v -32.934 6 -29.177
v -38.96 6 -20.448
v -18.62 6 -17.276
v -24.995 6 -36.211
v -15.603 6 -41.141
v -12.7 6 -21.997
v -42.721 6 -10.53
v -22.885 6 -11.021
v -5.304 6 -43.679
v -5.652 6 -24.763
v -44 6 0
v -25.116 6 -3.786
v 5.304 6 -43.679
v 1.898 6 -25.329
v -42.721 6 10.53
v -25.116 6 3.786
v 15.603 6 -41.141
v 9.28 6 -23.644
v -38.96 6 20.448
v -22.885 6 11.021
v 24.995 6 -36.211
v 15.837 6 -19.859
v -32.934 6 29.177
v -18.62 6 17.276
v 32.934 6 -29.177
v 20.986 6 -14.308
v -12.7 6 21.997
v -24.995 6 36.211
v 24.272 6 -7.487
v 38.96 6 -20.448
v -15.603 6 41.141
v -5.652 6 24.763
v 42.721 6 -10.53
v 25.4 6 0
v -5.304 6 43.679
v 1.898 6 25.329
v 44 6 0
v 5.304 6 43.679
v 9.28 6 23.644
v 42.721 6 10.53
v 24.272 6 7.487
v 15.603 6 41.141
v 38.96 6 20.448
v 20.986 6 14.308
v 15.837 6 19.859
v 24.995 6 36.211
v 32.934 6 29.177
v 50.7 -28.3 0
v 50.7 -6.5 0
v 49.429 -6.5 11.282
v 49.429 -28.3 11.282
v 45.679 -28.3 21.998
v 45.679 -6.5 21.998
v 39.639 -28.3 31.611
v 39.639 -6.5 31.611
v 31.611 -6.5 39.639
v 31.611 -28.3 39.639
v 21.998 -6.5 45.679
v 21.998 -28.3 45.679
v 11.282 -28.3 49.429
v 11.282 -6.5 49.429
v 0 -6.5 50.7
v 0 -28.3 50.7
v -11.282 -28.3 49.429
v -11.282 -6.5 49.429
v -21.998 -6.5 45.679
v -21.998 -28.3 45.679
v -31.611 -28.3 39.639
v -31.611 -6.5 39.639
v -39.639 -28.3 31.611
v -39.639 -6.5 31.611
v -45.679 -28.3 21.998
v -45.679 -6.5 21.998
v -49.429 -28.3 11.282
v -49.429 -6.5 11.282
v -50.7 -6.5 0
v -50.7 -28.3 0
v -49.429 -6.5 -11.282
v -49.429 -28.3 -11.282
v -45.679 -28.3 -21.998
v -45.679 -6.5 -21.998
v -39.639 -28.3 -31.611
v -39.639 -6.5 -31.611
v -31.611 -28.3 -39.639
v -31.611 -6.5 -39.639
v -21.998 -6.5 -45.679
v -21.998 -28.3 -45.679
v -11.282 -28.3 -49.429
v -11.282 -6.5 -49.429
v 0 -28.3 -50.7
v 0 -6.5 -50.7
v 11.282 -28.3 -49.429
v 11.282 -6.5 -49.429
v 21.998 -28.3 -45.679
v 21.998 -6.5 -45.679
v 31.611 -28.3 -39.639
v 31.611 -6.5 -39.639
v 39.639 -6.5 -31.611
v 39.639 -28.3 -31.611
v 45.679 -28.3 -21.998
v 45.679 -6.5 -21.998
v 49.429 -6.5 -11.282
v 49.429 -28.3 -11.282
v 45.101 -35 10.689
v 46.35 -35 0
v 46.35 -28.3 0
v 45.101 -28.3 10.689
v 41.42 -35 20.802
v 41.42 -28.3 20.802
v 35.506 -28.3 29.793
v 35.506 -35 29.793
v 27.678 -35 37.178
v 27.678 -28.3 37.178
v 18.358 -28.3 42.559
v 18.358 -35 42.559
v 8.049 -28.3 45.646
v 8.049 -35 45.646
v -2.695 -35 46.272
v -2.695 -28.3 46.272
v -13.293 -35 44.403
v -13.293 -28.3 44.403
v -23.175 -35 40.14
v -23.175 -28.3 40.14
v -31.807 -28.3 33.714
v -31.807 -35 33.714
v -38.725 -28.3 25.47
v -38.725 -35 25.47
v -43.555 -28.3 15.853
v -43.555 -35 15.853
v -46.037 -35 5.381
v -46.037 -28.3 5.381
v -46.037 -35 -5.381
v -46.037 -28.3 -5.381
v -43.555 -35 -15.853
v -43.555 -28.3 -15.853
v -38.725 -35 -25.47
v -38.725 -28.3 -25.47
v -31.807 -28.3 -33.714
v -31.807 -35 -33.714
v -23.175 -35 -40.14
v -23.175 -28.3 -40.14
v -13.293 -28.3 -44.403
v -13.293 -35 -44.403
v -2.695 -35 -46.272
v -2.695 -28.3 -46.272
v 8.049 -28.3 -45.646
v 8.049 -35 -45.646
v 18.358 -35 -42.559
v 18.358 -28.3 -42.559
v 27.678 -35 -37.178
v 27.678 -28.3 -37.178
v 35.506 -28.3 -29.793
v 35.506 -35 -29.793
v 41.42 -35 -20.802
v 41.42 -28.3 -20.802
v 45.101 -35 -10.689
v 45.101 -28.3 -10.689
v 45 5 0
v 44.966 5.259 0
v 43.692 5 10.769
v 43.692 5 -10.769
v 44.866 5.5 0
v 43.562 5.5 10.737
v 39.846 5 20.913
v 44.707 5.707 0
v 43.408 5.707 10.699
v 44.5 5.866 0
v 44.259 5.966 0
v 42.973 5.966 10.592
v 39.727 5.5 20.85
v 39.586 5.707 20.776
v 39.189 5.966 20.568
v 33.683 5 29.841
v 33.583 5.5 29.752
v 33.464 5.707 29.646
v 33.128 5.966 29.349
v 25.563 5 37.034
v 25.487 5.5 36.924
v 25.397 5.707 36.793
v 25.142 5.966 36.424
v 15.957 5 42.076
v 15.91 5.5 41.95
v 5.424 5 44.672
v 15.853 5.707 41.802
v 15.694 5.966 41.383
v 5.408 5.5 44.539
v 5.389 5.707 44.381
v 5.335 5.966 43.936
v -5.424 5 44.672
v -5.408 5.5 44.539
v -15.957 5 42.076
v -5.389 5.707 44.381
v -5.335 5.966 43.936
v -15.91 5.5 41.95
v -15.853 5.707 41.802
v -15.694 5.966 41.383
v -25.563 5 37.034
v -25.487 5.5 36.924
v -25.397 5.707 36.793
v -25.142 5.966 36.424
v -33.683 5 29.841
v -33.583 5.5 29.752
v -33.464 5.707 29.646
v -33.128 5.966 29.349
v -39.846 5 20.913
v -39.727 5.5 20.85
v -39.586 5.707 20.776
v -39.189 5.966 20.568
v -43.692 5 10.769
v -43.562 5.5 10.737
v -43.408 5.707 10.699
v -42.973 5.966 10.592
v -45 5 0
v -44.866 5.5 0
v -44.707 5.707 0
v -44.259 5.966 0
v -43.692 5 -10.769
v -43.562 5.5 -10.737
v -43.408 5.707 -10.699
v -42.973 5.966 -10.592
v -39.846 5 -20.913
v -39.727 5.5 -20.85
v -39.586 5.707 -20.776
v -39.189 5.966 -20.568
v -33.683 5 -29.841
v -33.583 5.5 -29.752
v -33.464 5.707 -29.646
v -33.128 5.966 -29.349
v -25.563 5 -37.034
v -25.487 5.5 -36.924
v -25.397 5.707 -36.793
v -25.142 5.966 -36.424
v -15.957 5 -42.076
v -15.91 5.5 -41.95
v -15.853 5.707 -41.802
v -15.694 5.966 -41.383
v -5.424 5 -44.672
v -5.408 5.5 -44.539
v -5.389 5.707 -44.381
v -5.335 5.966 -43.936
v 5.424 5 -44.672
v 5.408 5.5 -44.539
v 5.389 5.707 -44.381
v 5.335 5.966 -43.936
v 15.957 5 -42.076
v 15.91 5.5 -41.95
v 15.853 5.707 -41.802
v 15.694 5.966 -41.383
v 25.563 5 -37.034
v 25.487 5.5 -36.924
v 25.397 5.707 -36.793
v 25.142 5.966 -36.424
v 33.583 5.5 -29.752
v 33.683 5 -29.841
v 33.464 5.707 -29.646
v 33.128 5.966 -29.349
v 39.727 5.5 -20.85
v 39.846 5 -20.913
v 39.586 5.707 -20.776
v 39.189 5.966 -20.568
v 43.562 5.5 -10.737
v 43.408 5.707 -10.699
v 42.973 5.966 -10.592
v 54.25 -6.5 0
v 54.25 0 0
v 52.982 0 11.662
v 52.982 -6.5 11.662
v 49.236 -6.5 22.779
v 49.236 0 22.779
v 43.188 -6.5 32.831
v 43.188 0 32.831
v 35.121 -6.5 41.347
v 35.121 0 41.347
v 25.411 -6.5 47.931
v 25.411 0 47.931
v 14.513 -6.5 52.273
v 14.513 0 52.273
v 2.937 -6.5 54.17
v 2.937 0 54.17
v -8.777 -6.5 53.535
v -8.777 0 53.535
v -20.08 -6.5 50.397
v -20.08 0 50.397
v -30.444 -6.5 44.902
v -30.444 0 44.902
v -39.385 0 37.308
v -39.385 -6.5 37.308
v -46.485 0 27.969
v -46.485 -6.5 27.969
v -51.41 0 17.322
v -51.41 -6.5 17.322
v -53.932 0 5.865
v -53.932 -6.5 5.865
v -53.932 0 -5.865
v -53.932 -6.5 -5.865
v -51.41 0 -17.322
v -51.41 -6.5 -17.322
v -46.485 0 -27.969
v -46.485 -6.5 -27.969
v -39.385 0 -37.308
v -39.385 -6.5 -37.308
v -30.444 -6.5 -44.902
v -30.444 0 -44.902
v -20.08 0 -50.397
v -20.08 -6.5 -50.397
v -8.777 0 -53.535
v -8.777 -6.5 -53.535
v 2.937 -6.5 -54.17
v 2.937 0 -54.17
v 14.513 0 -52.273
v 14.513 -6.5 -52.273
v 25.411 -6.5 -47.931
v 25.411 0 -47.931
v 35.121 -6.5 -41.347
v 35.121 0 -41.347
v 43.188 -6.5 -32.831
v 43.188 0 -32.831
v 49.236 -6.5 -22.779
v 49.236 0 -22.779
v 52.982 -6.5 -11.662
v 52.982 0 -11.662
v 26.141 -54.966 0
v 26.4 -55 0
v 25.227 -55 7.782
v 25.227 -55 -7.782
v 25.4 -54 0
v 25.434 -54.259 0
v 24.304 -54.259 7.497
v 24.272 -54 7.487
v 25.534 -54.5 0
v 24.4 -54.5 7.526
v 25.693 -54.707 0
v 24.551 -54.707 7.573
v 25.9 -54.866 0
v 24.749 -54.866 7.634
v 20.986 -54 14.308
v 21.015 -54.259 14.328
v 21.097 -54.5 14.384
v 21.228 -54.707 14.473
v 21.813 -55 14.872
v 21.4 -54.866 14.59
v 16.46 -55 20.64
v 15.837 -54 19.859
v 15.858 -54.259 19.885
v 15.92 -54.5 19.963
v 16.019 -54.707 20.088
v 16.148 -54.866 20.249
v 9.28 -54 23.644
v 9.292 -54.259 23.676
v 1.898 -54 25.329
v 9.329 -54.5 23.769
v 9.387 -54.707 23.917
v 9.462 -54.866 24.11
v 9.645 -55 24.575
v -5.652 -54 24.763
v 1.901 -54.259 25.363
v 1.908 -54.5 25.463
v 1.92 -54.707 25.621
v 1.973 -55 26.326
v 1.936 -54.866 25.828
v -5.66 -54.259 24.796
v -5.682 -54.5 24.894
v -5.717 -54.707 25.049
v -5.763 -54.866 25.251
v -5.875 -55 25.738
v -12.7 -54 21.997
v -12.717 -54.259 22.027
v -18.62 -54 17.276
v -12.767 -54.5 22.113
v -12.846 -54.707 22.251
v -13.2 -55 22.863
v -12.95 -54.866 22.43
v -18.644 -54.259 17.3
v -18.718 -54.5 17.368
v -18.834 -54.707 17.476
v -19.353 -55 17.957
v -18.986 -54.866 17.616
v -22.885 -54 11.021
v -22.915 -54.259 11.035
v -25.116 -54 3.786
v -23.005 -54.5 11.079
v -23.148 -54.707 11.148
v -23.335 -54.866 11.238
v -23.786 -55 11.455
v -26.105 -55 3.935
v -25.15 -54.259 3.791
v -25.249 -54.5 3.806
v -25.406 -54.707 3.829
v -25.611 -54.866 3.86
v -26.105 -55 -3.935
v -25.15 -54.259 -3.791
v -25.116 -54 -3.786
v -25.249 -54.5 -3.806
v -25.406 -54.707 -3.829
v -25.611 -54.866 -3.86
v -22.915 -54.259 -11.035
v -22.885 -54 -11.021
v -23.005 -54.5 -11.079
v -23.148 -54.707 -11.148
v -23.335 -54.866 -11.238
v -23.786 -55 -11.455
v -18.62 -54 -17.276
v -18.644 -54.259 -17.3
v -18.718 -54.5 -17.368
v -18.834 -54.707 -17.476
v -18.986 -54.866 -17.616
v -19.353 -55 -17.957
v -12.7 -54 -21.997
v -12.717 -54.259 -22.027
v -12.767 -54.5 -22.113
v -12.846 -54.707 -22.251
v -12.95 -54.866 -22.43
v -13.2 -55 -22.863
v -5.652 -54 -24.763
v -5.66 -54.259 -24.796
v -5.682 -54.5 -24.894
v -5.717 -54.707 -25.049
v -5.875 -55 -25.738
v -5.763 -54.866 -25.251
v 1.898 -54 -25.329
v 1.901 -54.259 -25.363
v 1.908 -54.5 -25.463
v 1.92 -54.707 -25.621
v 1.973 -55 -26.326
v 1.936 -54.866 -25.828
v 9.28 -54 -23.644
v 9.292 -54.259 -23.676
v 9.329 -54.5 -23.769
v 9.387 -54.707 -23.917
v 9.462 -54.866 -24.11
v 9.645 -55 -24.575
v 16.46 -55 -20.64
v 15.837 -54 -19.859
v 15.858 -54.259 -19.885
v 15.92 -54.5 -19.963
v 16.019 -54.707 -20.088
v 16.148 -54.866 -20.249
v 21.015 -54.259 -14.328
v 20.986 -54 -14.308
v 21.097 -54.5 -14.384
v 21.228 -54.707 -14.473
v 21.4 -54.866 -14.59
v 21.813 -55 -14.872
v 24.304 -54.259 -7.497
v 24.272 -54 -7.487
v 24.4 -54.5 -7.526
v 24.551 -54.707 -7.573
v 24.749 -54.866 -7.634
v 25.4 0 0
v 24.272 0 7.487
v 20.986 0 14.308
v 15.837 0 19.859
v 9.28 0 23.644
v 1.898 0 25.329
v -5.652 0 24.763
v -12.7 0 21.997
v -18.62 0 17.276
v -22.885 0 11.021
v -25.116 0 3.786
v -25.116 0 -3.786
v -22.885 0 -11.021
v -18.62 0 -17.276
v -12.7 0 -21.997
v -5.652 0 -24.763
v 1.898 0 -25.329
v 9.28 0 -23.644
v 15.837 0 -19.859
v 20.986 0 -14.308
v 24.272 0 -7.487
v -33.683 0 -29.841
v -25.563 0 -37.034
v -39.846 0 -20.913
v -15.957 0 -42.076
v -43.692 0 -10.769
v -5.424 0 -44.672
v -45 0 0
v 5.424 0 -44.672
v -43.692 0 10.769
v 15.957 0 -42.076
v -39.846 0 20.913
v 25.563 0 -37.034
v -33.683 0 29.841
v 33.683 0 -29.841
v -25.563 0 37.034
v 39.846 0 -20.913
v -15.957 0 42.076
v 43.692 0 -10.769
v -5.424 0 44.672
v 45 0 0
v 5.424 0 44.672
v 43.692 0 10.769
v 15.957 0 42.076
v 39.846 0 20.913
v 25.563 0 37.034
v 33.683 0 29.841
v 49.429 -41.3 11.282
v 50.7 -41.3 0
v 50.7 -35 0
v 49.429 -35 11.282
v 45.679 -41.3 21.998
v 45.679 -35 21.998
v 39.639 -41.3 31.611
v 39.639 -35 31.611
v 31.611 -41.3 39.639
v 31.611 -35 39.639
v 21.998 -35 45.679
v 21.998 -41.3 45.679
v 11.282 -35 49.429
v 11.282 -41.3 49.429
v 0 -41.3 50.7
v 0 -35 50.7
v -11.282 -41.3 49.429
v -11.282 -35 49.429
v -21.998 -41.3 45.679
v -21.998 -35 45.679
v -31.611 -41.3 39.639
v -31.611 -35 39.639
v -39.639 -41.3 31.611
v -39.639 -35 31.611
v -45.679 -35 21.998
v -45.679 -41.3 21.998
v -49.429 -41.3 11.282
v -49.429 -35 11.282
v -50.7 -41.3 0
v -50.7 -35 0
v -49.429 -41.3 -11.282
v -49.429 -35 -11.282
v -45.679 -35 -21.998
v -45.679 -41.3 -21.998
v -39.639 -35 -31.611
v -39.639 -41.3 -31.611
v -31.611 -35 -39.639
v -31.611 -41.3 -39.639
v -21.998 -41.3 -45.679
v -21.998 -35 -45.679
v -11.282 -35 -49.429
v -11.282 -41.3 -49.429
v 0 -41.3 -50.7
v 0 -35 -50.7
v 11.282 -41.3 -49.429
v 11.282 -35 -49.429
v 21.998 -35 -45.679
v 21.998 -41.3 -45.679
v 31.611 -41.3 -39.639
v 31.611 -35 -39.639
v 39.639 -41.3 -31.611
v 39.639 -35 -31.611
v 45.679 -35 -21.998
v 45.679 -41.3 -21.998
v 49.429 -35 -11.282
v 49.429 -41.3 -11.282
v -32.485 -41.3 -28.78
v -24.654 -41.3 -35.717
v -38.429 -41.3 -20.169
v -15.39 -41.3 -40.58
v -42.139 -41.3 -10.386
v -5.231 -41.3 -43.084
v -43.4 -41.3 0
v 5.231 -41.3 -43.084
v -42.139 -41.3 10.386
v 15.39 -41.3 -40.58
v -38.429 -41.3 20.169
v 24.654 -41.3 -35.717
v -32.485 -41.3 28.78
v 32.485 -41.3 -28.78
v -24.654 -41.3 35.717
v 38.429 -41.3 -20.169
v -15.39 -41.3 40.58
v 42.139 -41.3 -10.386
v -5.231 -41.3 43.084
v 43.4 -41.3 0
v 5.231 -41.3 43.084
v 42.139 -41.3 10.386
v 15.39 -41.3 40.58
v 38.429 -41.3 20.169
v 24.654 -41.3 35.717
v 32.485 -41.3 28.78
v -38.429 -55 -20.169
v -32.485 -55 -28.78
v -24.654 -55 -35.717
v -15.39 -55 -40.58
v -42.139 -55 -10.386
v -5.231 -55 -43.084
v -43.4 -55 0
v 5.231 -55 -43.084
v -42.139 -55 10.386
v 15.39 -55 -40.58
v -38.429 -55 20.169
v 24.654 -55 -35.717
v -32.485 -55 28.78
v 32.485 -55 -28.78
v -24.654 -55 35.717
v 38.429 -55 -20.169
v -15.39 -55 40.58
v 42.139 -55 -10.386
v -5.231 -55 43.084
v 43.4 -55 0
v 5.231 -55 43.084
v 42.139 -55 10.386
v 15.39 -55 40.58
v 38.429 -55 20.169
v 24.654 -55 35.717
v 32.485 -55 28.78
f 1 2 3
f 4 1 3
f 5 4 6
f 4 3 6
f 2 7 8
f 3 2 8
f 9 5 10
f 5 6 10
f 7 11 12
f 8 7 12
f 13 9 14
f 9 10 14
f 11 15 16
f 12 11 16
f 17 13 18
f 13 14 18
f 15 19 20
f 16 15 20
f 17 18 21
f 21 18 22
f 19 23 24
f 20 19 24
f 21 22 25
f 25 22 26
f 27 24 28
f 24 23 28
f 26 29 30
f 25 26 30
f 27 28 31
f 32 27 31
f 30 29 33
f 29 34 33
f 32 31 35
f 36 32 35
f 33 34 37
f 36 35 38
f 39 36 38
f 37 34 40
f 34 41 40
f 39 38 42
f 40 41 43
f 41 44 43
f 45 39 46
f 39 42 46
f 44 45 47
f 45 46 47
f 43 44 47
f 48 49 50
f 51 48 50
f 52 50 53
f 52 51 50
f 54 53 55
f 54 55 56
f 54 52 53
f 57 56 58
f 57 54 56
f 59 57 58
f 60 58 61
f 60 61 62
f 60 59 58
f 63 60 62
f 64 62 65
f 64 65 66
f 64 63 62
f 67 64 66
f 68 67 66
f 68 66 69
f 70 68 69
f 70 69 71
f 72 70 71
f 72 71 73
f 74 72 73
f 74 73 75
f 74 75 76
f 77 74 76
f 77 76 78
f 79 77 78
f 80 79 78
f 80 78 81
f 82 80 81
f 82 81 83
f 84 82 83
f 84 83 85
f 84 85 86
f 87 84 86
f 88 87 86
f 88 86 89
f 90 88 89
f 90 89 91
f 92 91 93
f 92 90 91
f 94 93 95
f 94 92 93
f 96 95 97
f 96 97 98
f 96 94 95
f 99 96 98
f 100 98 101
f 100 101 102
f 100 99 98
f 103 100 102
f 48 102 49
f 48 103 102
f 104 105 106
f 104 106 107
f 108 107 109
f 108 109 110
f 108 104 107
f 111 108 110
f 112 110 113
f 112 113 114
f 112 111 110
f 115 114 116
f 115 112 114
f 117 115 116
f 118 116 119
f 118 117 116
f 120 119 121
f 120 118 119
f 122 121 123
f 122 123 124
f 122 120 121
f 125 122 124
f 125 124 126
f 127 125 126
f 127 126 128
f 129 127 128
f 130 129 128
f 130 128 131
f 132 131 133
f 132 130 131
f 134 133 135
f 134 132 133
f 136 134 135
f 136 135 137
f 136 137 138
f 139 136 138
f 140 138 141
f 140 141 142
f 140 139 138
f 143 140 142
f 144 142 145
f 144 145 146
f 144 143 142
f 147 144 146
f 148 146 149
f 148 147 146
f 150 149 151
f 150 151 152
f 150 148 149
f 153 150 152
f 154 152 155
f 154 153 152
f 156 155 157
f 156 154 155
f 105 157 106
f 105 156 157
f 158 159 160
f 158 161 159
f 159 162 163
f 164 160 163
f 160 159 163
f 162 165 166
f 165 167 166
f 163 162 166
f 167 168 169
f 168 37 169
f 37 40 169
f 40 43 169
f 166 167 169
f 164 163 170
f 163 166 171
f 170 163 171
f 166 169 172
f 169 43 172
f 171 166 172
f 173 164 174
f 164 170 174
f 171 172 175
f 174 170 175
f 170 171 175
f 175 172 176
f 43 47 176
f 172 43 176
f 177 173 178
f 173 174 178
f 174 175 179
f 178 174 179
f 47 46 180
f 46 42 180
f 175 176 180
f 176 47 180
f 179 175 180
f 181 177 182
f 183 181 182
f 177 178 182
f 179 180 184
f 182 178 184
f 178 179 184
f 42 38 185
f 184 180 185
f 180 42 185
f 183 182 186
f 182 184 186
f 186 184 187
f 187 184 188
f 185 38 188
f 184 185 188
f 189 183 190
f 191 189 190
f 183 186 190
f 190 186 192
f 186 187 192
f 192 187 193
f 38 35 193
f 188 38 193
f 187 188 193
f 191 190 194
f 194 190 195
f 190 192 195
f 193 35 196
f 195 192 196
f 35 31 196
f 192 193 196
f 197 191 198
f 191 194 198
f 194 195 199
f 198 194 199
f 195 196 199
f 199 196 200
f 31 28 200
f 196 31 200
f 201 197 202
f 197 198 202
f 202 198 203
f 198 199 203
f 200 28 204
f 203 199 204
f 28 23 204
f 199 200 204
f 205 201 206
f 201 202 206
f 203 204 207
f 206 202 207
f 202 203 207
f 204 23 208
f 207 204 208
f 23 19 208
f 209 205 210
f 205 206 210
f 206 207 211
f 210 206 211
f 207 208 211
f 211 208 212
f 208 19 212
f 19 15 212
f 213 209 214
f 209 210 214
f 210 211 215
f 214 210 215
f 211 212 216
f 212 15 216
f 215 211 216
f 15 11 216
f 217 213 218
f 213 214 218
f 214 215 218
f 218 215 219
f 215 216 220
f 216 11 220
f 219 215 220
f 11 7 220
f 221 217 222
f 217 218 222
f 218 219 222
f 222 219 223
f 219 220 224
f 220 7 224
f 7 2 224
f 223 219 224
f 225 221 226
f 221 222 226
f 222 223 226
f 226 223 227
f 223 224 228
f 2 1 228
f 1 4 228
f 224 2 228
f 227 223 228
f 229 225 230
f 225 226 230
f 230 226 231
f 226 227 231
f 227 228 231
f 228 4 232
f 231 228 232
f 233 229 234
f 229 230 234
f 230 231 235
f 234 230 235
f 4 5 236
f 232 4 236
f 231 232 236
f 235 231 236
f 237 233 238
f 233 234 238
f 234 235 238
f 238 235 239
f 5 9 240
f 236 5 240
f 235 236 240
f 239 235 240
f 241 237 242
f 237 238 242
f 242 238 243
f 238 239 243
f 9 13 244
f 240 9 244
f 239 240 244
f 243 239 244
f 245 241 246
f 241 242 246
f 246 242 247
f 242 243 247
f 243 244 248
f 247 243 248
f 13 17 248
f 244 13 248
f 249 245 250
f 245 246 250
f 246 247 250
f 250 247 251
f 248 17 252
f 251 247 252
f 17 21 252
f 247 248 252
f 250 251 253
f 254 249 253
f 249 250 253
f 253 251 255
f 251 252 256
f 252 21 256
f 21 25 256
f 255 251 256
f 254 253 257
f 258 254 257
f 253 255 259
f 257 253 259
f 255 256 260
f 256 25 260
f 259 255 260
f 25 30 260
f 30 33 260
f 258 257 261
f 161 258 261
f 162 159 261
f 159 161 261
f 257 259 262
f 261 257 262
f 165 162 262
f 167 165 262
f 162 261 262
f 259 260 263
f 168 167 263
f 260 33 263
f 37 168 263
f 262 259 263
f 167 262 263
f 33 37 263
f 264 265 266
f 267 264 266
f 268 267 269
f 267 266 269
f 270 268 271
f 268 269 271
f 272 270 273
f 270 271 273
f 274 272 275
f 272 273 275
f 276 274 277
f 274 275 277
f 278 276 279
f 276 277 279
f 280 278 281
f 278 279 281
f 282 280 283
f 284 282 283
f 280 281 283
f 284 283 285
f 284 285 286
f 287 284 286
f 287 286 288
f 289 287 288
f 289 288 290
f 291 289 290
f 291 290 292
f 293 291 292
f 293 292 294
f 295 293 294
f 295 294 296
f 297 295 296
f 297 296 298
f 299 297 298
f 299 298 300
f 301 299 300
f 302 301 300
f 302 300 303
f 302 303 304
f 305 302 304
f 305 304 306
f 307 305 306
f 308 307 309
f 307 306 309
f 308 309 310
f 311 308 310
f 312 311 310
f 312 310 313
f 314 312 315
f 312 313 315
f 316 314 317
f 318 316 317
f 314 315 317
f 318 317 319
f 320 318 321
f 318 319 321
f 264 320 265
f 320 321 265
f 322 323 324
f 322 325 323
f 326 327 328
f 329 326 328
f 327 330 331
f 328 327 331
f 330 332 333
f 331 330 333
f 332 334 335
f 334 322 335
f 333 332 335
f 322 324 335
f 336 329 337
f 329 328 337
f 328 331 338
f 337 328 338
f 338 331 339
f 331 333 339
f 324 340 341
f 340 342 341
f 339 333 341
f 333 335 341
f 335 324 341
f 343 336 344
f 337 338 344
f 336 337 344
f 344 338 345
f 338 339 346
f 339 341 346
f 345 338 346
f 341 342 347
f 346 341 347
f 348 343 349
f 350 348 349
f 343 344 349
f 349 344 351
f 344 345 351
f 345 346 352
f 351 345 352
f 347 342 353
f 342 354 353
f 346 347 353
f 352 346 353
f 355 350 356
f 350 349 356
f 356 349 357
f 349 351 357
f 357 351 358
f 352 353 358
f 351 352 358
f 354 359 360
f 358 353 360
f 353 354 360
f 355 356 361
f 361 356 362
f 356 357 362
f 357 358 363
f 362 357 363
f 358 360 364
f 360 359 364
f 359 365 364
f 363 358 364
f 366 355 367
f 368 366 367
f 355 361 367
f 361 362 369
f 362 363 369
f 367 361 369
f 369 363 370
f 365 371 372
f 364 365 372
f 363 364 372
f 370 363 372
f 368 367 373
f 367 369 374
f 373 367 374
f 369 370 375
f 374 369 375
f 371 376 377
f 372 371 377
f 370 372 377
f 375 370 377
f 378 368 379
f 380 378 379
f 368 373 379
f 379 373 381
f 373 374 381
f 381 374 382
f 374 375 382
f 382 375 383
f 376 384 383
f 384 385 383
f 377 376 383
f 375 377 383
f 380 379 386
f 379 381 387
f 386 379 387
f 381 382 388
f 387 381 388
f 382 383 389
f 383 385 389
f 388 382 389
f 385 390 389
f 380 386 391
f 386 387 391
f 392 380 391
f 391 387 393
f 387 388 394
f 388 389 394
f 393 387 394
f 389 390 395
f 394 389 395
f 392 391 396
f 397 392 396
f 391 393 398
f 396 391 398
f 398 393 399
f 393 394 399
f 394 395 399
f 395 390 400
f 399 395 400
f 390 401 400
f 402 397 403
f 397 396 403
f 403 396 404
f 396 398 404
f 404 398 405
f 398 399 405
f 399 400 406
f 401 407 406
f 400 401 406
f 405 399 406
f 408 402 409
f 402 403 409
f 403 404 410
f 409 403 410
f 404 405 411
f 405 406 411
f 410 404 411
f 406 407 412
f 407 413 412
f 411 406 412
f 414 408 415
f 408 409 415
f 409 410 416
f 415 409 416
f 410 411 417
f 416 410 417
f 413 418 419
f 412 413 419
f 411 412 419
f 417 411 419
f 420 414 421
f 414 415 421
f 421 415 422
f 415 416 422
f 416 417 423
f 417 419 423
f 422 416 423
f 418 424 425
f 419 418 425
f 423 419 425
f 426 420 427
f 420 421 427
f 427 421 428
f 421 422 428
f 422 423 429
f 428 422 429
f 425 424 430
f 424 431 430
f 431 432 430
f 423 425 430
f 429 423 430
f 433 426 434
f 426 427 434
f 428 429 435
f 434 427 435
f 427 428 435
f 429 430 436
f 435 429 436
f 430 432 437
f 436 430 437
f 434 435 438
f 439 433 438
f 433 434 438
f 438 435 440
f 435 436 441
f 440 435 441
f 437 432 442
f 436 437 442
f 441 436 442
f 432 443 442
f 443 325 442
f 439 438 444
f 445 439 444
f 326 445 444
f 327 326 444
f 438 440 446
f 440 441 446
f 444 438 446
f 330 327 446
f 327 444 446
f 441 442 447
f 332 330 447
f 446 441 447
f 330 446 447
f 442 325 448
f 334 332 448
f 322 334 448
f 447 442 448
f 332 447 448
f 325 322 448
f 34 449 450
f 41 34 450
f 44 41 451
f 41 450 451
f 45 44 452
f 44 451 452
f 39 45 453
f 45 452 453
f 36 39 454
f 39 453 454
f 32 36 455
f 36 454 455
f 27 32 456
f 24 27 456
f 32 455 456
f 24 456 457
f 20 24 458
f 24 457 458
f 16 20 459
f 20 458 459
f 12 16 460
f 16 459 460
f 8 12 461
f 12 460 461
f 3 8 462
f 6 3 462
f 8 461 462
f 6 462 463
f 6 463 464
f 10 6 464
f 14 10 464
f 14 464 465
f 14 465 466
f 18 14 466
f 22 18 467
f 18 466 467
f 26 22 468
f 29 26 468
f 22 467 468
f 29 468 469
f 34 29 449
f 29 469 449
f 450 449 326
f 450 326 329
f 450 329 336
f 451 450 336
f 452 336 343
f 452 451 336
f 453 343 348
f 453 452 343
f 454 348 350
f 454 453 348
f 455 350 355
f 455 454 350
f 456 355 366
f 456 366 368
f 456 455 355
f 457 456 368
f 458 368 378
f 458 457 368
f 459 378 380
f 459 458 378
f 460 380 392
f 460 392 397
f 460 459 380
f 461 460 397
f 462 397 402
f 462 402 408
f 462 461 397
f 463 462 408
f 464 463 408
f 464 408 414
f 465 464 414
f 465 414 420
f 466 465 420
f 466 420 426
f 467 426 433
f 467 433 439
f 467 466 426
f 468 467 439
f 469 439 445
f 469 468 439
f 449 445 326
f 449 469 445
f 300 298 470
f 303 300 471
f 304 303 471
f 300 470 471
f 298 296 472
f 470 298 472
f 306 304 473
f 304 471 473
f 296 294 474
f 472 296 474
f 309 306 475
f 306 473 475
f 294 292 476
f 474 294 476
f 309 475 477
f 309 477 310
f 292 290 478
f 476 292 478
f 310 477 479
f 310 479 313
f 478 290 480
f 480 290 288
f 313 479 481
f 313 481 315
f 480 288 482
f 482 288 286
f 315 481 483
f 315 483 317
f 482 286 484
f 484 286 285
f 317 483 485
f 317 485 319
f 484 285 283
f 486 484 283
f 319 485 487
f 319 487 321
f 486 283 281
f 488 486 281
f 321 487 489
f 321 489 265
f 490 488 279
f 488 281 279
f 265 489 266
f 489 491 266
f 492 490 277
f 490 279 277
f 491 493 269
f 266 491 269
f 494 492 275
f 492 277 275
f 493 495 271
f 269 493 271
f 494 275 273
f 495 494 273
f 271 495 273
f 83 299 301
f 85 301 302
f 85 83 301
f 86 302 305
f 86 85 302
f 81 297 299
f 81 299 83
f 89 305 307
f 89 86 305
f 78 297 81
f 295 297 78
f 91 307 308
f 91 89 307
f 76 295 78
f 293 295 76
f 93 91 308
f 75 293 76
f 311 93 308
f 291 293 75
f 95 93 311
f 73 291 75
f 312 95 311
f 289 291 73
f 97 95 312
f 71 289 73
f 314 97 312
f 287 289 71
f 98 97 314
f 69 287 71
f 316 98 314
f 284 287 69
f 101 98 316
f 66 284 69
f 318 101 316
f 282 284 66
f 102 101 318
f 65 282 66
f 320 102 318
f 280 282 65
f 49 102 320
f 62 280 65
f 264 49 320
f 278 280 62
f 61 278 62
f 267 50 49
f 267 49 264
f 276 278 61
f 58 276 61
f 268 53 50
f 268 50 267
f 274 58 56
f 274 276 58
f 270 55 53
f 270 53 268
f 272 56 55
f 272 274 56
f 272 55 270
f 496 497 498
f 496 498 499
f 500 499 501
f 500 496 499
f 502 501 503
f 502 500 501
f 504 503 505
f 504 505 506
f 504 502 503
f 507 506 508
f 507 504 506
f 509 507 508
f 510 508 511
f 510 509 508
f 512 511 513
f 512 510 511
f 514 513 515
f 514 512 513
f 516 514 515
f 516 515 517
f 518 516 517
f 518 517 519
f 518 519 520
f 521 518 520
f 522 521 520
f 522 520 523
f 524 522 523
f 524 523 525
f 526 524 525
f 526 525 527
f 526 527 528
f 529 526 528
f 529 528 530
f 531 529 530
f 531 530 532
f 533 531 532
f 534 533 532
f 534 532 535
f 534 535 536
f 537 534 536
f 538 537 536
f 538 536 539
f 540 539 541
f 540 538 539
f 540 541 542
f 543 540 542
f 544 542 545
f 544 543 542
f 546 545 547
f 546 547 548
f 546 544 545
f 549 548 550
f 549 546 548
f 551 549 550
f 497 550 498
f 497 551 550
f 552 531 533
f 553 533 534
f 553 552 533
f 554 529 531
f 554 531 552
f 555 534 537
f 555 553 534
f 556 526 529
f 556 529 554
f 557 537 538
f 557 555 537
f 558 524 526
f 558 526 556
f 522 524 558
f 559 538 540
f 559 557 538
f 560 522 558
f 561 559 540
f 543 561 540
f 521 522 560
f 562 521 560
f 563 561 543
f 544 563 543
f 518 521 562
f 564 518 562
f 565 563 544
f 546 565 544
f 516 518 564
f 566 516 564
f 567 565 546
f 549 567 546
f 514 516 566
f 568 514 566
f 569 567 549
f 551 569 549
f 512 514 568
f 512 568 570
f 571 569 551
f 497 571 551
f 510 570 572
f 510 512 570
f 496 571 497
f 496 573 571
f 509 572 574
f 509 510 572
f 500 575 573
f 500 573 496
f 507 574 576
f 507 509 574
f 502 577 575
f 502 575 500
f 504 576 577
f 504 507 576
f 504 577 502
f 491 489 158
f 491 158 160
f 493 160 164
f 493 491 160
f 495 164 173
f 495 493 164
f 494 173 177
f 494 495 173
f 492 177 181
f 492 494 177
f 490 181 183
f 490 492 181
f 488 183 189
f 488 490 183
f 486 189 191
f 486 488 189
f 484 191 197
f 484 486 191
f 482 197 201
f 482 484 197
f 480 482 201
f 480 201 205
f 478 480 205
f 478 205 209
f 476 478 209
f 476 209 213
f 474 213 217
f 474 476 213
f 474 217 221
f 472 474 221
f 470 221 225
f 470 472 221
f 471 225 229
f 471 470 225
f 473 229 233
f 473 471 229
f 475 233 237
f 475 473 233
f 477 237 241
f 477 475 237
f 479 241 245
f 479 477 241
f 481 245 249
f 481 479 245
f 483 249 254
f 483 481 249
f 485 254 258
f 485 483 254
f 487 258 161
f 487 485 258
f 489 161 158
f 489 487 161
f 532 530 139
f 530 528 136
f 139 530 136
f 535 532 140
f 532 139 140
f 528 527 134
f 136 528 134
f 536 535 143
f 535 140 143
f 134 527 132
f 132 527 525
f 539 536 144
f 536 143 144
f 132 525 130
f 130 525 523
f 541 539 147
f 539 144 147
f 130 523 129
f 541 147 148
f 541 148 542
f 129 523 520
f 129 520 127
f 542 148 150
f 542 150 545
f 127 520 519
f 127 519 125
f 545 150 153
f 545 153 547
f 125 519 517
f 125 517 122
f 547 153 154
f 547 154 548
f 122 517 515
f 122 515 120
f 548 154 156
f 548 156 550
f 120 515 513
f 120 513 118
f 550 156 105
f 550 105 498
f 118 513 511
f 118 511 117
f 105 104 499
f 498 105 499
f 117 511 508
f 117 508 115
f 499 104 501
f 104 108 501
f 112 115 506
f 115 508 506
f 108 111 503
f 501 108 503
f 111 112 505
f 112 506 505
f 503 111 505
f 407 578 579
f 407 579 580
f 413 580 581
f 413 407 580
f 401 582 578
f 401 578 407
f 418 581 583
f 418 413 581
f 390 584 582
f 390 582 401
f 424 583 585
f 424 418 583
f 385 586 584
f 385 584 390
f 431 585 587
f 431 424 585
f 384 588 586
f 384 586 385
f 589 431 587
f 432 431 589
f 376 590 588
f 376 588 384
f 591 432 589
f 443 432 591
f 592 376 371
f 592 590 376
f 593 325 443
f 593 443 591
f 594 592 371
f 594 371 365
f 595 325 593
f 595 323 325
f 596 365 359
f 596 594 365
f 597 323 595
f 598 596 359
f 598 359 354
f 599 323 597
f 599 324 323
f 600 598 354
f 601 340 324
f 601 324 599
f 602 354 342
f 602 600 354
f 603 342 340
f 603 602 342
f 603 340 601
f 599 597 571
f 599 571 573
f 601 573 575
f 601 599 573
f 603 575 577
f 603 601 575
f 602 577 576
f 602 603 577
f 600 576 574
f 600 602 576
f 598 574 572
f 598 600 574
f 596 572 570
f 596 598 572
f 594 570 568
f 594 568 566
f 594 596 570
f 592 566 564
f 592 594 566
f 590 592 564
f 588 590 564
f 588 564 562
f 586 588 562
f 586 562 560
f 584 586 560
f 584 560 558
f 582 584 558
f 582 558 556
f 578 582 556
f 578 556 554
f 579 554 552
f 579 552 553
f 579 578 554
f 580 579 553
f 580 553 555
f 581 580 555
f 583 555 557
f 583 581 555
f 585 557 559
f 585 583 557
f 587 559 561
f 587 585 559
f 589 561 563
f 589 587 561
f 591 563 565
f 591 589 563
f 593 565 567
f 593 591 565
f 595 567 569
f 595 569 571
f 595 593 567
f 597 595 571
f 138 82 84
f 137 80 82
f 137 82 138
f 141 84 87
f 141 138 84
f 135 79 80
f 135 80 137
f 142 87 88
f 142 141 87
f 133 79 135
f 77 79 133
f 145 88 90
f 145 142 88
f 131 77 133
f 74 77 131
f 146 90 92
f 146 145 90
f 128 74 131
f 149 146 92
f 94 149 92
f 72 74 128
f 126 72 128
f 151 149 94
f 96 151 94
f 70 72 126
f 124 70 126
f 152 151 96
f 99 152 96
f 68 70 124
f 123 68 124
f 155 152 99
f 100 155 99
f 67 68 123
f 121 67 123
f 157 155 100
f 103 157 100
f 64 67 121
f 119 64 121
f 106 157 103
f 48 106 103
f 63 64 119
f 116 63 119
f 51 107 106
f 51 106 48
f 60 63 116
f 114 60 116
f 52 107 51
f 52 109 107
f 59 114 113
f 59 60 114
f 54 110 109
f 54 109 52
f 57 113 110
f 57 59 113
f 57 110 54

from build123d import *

# Parameters (mm, degrees)
F0_R      = 54.25
F0_R_2    = 25.4
F1_DEPTH  = 55
F3_START  = -20
F2_R      = 54.25
F2_R_2    = 46.35
F3_DEPTH  = 6.7
F4_R      = 54.25
F4_R_2    = 50.7
F5_DEPTH  = 48.5
F6_R      = 50.7
F6_R_2    = 43.4
F7_DEPTH  = 13.7
F8_R      = 1
F9_R      = 45
F9_R_2    = 25.4
F10_DEPTH = 6
F11_R     = 1


with BuildPart() as f1:
    # F0 (on Front) → F1 (new body)
    with BuildSketch(Plane.XZ):
        Circle(F0_R)
        Circle(F0_R_2, mode=Mode.SUBTRACT)
    extrude(amount=F1_DEPTH)

    # F2 (on face) → F3 (cut)
    with BuildSketch(Plane.XZ.offset(55).offset(F3_START)):
        Circle(F2_R)
        Circle(F2_R_2, mode=Mode.SUBTRACT)
    extrude(amount=-F3_DEPTH, mode=Mode.SUBTRACT)

    # F4 (on face) → F5 (cut)
    with BuildSketch(Plane.XZ.offset(55)):
        Circle(F4_R)
        Circle(F4_R_2, mode=Mode.SUBTRACT)
    extrude(amount=-F5_DEPTH, mode=Mode.SUBTRACT)

    # F6 (on face) → F7 (cut)
    with BuildSketch(Plane.XZ.offset(55)):
        Circle(F6_R)
        Circle(F6_R_2, mode=Mode.SUBTRACT)
    extrude(amount=-F7_DEPTH, mode=Mode.SUBTRACT)

    # F8
    f8_edges = [f1.edges().sort_by_distance(p)[0] for p in [
        (-25.4, -55, 0),
    ]]
    fillet(f8_edges, radius=F8_R)

    # F9 (on Front) → F10 (join)
    with BuildSketch(Plane.XZ):
        Circle(F9_R)
        Circle(F9_R_2, mode=Mode.SUBTRACT)
    extrude(amount=-F10_DEPTH)

    # F11
    f11_edges = [f1.edges().sort_by_distance(p)[0] for p in [
        (-45, 6, 0),
    ]]
    fillet(f11_edges, radius=F11_R)


solid = f1.part
